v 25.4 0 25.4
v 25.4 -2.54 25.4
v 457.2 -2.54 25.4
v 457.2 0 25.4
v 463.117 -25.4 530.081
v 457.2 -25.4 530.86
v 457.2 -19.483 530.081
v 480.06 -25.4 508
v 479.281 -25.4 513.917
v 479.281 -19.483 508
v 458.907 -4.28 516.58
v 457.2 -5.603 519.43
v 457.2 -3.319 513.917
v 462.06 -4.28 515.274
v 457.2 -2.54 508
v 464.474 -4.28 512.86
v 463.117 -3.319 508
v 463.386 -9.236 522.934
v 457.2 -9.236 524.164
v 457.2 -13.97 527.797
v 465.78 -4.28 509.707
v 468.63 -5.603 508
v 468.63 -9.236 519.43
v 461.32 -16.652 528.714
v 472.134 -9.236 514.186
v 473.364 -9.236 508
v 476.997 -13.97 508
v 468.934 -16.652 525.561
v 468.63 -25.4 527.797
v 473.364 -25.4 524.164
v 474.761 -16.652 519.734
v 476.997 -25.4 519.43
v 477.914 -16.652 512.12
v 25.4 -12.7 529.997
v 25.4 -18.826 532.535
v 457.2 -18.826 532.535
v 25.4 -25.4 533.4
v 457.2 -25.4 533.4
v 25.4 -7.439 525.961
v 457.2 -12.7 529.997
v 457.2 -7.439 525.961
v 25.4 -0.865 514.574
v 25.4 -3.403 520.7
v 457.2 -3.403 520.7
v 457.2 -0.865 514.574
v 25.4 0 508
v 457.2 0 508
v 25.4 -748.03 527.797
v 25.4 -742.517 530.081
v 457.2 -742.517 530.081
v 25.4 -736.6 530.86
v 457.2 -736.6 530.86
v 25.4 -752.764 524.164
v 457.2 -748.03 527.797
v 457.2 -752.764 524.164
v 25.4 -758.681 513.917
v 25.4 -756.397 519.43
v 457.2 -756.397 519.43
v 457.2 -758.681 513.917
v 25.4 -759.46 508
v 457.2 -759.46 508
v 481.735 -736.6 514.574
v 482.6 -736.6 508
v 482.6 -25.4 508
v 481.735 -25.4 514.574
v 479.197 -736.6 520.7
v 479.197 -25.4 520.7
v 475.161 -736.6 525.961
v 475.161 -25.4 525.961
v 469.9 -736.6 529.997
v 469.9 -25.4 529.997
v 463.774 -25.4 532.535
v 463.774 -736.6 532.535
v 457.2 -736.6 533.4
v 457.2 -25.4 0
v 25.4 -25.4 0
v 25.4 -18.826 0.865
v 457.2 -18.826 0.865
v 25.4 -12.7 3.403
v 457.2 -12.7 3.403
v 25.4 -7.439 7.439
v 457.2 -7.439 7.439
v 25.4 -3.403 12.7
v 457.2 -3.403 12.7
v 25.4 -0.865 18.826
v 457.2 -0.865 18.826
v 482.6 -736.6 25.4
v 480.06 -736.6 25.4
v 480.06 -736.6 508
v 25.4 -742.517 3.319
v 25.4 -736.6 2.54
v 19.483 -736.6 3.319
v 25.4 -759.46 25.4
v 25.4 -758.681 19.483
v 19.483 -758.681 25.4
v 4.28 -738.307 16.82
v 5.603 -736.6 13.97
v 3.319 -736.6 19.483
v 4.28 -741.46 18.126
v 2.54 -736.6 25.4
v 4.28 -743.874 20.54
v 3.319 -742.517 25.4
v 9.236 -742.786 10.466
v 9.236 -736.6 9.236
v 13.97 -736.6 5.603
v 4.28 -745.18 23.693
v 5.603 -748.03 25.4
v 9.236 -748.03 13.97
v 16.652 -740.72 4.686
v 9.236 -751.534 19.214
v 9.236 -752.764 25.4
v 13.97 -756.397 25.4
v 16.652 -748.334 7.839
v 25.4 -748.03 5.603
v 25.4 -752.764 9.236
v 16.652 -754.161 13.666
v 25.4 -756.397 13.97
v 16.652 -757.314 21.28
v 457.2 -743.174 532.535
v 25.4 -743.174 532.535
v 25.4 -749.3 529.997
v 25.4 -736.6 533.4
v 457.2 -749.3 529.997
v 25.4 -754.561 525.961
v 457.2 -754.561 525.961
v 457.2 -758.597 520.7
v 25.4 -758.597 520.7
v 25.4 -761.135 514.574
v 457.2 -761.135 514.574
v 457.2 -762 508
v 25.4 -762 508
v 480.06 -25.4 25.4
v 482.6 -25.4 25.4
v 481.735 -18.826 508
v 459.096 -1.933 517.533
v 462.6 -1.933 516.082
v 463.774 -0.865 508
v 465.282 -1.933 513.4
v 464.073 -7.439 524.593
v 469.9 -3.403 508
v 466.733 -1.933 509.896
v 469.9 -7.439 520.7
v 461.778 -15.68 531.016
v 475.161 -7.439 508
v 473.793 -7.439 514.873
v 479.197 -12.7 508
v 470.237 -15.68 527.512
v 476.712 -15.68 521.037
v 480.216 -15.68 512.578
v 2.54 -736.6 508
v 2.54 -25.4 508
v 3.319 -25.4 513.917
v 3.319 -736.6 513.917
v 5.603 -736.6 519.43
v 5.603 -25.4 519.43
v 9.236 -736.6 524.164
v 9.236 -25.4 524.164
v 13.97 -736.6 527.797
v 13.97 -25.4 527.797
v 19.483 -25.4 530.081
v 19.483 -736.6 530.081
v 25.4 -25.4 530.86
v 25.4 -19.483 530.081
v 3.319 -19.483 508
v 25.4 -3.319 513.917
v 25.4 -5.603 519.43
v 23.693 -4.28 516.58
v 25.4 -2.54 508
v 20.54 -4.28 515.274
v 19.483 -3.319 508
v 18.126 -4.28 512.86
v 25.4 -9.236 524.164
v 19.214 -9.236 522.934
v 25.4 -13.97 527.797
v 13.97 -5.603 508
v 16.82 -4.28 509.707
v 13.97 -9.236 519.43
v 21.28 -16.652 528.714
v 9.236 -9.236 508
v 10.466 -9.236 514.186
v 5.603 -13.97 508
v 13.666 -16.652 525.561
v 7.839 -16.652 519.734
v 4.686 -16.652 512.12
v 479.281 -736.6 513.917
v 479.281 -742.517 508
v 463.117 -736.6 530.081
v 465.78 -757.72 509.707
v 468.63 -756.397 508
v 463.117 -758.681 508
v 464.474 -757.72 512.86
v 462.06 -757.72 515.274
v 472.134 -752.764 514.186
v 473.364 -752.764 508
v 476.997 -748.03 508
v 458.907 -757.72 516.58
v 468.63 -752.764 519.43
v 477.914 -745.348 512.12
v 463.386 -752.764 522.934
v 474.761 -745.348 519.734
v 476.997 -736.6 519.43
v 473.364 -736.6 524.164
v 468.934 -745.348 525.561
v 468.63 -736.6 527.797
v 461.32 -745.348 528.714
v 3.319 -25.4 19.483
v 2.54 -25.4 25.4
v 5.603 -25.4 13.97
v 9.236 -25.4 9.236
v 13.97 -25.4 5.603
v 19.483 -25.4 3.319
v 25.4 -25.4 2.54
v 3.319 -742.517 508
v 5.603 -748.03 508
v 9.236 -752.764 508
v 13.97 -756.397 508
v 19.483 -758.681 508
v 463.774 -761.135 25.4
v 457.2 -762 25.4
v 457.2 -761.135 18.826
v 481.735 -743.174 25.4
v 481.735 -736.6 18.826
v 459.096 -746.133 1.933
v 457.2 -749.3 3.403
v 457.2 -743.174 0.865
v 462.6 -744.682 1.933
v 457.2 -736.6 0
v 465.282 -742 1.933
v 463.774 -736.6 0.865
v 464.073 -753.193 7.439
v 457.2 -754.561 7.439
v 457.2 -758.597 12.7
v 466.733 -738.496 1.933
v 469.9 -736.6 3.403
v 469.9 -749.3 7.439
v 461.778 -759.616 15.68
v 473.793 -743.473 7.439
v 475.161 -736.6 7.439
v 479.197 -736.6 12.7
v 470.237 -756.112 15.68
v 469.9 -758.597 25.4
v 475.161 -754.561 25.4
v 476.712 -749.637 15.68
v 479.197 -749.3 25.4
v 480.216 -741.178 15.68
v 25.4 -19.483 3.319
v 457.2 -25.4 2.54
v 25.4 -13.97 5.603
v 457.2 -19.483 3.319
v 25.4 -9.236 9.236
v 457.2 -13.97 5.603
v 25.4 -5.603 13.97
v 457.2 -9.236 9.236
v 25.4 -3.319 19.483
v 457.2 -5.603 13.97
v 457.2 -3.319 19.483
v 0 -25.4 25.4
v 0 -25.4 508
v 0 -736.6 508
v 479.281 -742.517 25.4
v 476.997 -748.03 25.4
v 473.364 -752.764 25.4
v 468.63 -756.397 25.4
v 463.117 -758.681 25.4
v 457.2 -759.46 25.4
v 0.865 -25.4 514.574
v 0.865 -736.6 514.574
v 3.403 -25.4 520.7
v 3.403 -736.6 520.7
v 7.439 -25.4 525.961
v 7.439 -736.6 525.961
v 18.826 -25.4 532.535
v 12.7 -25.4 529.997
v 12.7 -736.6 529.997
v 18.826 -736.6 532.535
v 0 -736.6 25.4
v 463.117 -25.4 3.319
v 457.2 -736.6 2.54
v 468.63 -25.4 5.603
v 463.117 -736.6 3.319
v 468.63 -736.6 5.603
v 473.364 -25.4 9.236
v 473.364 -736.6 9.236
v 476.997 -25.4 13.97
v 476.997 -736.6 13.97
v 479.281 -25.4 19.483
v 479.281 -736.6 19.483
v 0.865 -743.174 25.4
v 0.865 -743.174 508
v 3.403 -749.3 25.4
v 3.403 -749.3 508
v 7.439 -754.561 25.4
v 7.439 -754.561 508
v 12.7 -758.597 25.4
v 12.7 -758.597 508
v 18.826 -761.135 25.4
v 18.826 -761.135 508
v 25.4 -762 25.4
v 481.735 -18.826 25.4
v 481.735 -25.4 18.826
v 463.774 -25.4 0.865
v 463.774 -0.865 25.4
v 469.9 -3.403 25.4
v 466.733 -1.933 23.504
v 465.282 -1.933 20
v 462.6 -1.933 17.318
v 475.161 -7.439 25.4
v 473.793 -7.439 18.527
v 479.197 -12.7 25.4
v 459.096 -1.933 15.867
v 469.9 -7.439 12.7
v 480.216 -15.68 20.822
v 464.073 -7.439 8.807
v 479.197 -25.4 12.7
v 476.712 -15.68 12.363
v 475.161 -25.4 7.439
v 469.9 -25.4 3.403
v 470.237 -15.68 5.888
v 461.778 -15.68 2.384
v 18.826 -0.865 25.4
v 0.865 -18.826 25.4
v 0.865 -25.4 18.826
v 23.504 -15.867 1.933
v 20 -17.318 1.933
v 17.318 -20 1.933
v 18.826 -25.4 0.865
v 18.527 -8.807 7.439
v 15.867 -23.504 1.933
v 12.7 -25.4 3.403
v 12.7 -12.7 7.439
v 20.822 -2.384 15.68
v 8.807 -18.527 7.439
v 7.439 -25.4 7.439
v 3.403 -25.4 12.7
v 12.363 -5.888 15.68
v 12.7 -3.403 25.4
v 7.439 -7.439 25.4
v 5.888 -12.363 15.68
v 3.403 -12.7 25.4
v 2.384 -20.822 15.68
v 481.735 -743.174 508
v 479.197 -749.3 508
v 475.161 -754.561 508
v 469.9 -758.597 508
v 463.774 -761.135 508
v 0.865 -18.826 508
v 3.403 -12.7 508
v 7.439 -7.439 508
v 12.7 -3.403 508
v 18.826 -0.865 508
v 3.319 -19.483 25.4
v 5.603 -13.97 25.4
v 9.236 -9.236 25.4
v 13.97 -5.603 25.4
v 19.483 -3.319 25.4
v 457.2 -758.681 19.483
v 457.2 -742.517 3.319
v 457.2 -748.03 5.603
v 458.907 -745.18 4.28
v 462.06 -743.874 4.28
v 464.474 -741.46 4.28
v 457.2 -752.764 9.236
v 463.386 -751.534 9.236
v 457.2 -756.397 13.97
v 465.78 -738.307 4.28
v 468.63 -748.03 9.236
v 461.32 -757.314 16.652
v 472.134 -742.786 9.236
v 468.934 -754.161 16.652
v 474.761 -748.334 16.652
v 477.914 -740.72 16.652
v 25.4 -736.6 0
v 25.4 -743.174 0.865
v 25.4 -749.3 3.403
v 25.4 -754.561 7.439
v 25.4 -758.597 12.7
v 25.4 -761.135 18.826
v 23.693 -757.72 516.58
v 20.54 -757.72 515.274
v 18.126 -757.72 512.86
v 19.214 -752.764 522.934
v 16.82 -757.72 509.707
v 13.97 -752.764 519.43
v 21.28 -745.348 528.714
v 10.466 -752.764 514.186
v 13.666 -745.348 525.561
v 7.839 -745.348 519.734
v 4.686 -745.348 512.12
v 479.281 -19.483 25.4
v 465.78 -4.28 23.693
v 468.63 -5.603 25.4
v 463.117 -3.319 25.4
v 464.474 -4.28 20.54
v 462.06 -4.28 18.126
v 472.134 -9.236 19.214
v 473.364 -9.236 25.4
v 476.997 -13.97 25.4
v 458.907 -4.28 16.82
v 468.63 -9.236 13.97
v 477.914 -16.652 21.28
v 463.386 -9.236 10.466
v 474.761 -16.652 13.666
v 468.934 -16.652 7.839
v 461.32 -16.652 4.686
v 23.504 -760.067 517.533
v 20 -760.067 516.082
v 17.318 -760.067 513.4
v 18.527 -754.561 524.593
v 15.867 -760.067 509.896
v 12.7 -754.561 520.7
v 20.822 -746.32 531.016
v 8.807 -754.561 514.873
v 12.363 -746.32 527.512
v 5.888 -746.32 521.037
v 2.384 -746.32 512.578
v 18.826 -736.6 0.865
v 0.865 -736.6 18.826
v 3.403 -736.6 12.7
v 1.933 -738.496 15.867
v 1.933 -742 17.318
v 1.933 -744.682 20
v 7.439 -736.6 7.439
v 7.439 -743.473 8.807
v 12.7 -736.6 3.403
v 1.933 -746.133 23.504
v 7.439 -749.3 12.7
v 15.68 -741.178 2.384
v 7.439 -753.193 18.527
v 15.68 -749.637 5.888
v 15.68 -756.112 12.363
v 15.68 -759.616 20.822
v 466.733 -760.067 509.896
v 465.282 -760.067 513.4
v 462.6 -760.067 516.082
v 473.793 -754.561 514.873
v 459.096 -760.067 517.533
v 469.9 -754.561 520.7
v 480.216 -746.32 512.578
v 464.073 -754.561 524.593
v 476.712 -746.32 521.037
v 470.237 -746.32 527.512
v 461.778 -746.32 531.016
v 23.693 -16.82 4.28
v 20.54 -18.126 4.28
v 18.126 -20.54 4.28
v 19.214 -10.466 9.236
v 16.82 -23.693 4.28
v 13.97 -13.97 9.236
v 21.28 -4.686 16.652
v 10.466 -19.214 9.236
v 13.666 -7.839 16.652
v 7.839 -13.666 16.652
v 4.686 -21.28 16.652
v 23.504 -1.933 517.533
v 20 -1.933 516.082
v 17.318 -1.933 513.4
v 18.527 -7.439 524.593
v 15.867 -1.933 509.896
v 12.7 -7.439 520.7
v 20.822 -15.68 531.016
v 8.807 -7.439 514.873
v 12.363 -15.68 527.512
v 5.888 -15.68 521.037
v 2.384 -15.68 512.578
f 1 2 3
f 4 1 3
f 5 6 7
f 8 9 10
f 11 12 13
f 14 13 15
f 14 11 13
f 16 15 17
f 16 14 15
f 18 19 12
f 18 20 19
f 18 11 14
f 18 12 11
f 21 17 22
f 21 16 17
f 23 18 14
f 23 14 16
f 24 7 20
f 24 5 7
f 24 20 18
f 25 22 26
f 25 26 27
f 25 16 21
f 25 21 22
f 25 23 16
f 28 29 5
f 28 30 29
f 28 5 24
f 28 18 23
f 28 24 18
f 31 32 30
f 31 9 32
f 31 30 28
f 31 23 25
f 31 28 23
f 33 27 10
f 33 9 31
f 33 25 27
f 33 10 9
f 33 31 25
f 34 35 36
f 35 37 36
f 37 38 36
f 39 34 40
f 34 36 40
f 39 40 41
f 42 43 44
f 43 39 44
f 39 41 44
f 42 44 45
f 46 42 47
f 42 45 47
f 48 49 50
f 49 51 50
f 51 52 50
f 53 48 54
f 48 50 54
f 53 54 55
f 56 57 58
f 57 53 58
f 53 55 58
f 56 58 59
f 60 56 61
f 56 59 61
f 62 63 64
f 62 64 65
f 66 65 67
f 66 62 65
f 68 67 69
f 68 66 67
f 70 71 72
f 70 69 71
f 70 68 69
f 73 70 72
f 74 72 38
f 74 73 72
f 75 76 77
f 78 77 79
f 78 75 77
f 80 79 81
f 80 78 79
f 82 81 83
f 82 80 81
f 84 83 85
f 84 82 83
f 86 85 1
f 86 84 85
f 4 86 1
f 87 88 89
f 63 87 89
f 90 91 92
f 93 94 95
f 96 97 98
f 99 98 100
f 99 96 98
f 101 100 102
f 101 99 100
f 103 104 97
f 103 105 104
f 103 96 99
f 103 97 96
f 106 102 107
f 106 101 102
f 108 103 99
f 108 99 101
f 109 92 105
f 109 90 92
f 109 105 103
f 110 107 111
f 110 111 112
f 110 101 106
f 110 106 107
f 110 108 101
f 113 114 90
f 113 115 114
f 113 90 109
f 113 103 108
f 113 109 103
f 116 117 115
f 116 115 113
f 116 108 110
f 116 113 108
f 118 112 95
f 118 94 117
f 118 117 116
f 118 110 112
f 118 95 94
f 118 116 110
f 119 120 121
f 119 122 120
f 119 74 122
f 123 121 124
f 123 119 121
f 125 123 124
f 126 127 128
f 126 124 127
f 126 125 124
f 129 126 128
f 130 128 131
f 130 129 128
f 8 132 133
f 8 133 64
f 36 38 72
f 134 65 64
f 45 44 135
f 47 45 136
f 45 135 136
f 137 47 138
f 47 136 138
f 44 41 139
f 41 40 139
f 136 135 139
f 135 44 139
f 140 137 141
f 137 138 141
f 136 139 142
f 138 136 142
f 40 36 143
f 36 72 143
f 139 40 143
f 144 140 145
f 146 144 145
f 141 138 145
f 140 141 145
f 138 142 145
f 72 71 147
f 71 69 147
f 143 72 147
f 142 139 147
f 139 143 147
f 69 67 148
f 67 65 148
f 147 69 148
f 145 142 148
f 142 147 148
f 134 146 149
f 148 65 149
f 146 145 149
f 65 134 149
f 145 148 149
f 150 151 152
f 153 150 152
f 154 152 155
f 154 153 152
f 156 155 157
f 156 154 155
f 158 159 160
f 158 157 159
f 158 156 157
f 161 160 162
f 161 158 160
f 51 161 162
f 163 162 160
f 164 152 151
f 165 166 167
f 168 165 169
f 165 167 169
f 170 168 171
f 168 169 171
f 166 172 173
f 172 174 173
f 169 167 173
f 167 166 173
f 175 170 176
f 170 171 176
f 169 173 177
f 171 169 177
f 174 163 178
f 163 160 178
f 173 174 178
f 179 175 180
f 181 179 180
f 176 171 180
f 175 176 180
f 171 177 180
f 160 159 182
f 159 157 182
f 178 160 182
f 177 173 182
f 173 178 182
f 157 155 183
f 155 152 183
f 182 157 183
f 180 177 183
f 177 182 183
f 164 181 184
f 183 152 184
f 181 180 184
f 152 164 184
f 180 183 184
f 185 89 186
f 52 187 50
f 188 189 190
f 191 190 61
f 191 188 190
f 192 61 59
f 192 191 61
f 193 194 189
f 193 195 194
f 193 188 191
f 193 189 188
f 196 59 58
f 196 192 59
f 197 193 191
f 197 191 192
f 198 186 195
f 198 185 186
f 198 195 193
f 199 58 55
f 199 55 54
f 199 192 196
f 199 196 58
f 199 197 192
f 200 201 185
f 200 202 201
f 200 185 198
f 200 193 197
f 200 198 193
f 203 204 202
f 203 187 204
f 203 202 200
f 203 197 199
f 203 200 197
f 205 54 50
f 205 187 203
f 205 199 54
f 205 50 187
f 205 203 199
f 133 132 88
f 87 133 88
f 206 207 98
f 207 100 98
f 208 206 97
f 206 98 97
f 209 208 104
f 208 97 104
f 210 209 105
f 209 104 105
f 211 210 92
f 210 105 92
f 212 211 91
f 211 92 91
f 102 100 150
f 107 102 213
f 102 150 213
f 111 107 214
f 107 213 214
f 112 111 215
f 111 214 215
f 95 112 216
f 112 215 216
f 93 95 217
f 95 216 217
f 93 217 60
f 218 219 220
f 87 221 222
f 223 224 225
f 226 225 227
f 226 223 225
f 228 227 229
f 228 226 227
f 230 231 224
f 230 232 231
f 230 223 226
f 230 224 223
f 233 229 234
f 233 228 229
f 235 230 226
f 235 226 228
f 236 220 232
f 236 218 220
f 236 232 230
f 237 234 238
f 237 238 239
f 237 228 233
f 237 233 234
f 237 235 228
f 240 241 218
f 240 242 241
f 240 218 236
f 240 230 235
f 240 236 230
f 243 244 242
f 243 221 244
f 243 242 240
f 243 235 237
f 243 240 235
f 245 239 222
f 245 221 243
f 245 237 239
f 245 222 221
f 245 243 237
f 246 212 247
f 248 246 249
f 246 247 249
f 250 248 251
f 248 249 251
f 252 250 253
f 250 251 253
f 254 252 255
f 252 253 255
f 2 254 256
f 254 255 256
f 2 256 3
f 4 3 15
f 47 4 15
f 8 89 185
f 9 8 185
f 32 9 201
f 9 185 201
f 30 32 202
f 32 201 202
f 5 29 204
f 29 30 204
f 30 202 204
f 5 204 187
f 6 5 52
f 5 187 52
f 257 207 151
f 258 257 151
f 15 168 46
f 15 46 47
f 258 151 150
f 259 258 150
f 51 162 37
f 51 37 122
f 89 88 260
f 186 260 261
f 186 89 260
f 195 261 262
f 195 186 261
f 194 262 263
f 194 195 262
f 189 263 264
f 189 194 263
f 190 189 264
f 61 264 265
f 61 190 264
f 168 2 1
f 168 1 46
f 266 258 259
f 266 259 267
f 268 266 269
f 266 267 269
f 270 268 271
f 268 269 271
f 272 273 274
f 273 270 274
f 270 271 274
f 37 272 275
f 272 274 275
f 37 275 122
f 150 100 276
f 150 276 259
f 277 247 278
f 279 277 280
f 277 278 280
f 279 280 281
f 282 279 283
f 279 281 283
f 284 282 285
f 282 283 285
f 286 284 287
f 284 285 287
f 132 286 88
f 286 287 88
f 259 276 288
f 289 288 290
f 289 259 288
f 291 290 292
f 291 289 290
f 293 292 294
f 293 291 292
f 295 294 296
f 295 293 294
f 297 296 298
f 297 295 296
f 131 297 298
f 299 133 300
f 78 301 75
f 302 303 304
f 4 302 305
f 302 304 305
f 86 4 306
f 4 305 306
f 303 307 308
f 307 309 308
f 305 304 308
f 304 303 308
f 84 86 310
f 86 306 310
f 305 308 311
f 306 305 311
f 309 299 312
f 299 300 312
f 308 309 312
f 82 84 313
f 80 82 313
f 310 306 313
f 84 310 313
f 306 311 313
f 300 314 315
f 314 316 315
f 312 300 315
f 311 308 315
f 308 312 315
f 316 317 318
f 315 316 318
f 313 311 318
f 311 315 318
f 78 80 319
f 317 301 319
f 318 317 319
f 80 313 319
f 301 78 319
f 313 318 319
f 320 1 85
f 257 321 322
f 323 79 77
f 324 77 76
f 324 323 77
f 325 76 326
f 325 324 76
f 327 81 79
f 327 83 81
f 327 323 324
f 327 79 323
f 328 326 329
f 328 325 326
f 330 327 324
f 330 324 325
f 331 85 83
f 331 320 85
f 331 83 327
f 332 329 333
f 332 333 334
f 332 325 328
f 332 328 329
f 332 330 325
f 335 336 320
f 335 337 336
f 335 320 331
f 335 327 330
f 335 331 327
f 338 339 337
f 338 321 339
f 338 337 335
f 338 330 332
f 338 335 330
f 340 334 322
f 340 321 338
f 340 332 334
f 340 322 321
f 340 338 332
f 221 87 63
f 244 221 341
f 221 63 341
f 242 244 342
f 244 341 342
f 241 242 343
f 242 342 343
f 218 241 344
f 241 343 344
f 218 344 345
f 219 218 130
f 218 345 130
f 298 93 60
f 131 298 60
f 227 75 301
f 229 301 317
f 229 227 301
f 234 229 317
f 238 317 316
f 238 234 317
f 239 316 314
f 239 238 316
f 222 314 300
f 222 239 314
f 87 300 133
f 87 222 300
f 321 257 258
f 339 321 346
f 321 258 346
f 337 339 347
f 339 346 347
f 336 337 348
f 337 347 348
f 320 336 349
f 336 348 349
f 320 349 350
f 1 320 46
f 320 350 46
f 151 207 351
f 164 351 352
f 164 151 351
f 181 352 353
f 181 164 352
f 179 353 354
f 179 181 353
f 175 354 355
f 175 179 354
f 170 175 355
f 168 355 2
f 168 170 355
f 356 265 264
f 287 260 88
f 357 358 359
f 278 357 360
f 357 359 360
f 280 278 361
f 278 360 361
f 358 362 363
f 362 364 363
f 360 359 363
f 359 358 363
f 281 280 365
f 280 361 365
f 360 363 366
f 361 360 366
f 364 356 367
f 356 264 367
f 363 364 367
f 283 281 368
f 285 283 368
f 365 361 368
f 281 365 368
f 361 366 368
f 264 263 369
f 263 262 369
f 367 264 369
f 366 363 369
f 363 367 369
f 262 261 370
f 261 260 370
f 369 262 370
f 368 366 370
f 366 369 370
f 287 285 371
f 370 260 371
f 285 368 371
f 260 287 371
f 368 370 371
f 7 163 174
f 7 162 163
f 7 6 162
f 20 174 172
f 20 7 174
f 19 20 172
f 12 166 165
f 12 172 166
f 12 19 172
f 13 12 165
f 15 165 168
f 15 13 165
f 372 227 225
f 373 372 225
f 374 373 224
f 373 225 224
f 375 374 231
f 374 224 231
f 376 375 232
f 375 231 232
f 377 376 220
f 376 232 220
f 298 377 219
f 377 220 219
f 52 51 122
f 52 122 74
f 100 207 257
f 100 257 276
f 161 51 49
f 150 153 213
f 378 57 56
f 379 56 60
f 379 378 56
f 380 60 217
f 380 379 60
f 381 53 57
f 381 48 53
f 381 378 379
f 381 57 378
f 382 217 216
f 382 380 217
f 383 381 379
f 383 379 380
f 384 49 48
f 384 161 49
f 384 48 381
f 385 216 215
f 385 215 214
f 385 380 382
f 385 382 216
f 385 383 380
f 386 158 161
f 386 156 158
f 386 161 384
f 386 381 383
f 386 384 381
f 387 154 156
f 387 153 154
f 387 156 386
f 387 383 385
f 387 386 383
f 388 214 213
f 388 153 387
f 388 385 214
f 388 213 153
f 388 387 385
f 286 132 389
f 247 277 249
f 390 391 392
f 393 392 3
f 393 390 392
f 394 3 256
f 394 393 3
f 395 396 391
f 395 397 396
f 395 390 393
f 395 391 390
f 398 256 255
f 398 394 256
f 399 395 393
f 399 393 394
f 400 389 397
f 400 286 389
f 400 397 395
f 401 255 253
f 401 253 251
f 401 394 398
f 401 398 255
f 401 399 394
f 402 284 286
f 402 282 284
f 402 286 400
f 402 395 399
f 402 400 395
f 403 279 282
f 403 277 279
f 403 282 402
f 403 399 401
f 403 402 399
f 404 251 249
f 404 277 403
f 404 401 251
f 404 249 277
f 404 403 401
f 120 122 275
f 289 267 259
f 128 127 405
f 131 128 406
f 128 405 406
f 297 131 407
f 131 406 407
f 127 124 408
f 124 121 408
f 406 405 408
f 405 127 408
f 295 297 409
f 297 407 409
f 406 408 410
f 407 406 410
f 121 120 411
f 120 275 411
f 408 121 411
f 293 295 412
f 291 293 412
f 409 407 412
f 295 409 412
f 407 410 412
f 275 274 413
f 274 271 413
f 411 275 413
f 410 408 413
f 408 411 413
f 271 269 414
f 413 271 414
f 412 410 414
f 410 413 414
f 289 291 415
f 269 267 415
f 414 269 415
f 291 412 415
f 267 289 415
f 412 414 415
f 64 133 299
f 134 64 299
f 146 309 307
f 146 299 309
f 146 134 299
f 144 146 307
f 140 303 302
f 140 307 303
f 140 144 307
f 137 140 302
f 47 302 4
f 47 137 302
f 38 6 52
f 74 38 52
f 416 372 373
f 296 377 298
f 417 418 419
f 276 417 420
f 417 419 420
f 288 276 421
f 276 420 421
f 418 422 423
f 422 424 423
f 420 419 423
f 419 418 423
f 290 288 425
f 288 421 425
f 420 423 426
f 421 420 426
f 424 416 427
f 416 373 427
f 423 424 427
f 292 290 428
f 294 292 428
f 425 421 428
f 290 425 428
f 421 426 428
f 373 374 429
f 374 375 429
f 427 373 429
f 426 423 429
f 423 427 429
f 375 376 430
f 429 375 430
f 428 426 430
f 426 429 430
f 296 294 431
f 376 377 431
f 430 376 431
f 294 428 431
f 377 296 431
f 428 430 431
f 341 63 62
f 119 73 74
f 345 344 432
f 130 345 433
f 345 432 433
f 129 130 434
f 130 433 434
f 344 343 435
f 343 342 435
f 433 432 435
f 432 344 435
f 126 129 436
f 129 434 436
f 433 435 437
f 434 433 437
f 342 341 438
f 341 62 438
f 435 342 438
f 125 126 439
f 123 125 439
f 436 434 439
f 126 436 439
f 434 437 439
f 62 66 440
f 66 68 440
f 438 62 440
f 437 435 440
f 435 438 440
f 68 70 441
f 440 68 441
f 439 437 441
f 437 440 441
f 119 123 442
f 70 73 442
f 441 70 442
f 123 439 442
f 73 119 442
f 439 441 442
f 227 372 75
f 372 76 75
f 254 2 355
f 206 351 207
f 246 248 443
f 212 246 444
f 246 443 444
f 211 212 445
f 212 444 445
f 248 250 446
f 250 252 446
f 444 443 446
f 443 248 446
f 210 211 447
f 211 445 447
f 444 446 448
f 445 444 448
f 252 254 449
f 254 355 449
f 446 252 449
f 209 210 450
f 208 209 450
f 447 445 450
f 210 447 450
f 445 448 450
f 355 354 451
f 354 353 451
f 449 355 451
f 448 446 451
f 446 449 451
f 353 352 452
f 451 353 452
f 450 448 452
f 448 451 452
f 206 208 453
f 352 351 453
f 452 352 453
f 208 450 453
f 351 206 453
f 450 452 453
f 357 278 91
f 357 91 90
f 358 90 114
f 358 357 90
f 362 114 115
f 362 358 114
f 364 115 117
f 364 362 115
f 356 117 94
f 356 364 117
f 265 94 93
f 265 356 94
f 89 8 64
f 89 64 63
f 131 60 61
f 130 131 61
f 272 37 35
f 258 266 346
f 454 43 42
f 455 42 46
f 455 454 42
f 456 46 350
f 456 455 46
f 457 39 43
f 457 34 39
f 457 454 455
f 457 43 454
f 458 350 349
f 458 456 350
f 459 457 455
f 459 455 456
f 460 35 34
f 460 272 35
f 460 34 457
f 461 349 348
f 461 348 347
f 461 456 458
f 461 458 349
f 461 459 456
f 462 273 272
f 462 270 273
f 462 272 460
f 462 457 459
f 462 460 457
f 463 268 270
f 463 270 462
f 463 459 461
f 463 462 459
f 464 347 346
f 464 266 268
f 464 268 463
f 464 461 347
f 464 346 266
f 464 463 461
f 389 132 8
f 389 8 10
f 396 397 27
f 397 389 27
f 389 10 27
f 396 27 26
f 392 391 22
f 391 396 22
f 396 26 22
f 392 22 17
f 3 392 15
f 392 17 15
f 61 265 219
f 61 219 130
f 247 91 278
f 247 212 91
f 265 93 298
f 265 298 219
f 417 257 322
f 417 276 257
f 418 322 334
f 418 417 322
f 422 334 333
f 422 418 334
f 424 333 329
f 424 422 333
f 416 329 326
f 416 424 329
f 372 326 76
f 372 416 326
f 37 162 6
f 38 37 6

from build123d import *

# Parameters (mm, degrees)
F0_W     = 482.6
F0_H     = 533.4
F1_DEPTH = 762
F2_R     = 25.4
F3_T     = -2.54


# Not quite as in the source:
# - a shell that OpenCascade refuses in one call is made with other operations: the cavity is built on its own and cut out


with BuildPart() as f1:
    # F0 (on Front) → F1 (new body)
    with BuildSketch(Plane.XZ):
        with Locations((241.3, 266.7)):
            Rectangle(F0_W, F0_H)
    extrude(amount=F1_DEPTH)

    # F2
    f2_edges = [f1.edges().sort_by_distance(p)[0] for p in [
        (482.6, -381, 533.4),
        (482.6, -762, 266.7),
        (0, -381, 533.4),
        (241.3, 0, 533.4),
        (241.3, -762, 533.4),
        (241.3, -762, 0),
        (482.6, -381, 0),
        (482.6, 0, 266.7),
        (0, 0, 266.7),
        (241.3, 0, 0),
        (0, -381, 0),
        (0, -762, 266.7),
    ]]
    fillet(f2_edges, radius=F2_R)

    # F3: a shell. OpenCascade refuses it in one call, so the cavity is built on its own and cut out:
    # the body offset inwards by the wall thickness, plus a prism from it out through each open face.
    f3_core = offset(f1.part, amount=F3_T, mode=Mode.PRIVATE)
    f3_exits = [f3_core.faces().sort_by_distance(p)[0] for p in [
        (241.3, -2.54, 266.7),
        (241.3, -759.46, 266.7),
        (480.06, -381, 266.7),
        (241.3, -381, 530.86),
        (2.54, -381, 266.7),
    ]]
    add(f3_core, mode=Mode.SUBTRACT)
    extrude(f3_exits, amount=-F3_T, mode=Mode.SUBTRACT)


solid = f1.part
